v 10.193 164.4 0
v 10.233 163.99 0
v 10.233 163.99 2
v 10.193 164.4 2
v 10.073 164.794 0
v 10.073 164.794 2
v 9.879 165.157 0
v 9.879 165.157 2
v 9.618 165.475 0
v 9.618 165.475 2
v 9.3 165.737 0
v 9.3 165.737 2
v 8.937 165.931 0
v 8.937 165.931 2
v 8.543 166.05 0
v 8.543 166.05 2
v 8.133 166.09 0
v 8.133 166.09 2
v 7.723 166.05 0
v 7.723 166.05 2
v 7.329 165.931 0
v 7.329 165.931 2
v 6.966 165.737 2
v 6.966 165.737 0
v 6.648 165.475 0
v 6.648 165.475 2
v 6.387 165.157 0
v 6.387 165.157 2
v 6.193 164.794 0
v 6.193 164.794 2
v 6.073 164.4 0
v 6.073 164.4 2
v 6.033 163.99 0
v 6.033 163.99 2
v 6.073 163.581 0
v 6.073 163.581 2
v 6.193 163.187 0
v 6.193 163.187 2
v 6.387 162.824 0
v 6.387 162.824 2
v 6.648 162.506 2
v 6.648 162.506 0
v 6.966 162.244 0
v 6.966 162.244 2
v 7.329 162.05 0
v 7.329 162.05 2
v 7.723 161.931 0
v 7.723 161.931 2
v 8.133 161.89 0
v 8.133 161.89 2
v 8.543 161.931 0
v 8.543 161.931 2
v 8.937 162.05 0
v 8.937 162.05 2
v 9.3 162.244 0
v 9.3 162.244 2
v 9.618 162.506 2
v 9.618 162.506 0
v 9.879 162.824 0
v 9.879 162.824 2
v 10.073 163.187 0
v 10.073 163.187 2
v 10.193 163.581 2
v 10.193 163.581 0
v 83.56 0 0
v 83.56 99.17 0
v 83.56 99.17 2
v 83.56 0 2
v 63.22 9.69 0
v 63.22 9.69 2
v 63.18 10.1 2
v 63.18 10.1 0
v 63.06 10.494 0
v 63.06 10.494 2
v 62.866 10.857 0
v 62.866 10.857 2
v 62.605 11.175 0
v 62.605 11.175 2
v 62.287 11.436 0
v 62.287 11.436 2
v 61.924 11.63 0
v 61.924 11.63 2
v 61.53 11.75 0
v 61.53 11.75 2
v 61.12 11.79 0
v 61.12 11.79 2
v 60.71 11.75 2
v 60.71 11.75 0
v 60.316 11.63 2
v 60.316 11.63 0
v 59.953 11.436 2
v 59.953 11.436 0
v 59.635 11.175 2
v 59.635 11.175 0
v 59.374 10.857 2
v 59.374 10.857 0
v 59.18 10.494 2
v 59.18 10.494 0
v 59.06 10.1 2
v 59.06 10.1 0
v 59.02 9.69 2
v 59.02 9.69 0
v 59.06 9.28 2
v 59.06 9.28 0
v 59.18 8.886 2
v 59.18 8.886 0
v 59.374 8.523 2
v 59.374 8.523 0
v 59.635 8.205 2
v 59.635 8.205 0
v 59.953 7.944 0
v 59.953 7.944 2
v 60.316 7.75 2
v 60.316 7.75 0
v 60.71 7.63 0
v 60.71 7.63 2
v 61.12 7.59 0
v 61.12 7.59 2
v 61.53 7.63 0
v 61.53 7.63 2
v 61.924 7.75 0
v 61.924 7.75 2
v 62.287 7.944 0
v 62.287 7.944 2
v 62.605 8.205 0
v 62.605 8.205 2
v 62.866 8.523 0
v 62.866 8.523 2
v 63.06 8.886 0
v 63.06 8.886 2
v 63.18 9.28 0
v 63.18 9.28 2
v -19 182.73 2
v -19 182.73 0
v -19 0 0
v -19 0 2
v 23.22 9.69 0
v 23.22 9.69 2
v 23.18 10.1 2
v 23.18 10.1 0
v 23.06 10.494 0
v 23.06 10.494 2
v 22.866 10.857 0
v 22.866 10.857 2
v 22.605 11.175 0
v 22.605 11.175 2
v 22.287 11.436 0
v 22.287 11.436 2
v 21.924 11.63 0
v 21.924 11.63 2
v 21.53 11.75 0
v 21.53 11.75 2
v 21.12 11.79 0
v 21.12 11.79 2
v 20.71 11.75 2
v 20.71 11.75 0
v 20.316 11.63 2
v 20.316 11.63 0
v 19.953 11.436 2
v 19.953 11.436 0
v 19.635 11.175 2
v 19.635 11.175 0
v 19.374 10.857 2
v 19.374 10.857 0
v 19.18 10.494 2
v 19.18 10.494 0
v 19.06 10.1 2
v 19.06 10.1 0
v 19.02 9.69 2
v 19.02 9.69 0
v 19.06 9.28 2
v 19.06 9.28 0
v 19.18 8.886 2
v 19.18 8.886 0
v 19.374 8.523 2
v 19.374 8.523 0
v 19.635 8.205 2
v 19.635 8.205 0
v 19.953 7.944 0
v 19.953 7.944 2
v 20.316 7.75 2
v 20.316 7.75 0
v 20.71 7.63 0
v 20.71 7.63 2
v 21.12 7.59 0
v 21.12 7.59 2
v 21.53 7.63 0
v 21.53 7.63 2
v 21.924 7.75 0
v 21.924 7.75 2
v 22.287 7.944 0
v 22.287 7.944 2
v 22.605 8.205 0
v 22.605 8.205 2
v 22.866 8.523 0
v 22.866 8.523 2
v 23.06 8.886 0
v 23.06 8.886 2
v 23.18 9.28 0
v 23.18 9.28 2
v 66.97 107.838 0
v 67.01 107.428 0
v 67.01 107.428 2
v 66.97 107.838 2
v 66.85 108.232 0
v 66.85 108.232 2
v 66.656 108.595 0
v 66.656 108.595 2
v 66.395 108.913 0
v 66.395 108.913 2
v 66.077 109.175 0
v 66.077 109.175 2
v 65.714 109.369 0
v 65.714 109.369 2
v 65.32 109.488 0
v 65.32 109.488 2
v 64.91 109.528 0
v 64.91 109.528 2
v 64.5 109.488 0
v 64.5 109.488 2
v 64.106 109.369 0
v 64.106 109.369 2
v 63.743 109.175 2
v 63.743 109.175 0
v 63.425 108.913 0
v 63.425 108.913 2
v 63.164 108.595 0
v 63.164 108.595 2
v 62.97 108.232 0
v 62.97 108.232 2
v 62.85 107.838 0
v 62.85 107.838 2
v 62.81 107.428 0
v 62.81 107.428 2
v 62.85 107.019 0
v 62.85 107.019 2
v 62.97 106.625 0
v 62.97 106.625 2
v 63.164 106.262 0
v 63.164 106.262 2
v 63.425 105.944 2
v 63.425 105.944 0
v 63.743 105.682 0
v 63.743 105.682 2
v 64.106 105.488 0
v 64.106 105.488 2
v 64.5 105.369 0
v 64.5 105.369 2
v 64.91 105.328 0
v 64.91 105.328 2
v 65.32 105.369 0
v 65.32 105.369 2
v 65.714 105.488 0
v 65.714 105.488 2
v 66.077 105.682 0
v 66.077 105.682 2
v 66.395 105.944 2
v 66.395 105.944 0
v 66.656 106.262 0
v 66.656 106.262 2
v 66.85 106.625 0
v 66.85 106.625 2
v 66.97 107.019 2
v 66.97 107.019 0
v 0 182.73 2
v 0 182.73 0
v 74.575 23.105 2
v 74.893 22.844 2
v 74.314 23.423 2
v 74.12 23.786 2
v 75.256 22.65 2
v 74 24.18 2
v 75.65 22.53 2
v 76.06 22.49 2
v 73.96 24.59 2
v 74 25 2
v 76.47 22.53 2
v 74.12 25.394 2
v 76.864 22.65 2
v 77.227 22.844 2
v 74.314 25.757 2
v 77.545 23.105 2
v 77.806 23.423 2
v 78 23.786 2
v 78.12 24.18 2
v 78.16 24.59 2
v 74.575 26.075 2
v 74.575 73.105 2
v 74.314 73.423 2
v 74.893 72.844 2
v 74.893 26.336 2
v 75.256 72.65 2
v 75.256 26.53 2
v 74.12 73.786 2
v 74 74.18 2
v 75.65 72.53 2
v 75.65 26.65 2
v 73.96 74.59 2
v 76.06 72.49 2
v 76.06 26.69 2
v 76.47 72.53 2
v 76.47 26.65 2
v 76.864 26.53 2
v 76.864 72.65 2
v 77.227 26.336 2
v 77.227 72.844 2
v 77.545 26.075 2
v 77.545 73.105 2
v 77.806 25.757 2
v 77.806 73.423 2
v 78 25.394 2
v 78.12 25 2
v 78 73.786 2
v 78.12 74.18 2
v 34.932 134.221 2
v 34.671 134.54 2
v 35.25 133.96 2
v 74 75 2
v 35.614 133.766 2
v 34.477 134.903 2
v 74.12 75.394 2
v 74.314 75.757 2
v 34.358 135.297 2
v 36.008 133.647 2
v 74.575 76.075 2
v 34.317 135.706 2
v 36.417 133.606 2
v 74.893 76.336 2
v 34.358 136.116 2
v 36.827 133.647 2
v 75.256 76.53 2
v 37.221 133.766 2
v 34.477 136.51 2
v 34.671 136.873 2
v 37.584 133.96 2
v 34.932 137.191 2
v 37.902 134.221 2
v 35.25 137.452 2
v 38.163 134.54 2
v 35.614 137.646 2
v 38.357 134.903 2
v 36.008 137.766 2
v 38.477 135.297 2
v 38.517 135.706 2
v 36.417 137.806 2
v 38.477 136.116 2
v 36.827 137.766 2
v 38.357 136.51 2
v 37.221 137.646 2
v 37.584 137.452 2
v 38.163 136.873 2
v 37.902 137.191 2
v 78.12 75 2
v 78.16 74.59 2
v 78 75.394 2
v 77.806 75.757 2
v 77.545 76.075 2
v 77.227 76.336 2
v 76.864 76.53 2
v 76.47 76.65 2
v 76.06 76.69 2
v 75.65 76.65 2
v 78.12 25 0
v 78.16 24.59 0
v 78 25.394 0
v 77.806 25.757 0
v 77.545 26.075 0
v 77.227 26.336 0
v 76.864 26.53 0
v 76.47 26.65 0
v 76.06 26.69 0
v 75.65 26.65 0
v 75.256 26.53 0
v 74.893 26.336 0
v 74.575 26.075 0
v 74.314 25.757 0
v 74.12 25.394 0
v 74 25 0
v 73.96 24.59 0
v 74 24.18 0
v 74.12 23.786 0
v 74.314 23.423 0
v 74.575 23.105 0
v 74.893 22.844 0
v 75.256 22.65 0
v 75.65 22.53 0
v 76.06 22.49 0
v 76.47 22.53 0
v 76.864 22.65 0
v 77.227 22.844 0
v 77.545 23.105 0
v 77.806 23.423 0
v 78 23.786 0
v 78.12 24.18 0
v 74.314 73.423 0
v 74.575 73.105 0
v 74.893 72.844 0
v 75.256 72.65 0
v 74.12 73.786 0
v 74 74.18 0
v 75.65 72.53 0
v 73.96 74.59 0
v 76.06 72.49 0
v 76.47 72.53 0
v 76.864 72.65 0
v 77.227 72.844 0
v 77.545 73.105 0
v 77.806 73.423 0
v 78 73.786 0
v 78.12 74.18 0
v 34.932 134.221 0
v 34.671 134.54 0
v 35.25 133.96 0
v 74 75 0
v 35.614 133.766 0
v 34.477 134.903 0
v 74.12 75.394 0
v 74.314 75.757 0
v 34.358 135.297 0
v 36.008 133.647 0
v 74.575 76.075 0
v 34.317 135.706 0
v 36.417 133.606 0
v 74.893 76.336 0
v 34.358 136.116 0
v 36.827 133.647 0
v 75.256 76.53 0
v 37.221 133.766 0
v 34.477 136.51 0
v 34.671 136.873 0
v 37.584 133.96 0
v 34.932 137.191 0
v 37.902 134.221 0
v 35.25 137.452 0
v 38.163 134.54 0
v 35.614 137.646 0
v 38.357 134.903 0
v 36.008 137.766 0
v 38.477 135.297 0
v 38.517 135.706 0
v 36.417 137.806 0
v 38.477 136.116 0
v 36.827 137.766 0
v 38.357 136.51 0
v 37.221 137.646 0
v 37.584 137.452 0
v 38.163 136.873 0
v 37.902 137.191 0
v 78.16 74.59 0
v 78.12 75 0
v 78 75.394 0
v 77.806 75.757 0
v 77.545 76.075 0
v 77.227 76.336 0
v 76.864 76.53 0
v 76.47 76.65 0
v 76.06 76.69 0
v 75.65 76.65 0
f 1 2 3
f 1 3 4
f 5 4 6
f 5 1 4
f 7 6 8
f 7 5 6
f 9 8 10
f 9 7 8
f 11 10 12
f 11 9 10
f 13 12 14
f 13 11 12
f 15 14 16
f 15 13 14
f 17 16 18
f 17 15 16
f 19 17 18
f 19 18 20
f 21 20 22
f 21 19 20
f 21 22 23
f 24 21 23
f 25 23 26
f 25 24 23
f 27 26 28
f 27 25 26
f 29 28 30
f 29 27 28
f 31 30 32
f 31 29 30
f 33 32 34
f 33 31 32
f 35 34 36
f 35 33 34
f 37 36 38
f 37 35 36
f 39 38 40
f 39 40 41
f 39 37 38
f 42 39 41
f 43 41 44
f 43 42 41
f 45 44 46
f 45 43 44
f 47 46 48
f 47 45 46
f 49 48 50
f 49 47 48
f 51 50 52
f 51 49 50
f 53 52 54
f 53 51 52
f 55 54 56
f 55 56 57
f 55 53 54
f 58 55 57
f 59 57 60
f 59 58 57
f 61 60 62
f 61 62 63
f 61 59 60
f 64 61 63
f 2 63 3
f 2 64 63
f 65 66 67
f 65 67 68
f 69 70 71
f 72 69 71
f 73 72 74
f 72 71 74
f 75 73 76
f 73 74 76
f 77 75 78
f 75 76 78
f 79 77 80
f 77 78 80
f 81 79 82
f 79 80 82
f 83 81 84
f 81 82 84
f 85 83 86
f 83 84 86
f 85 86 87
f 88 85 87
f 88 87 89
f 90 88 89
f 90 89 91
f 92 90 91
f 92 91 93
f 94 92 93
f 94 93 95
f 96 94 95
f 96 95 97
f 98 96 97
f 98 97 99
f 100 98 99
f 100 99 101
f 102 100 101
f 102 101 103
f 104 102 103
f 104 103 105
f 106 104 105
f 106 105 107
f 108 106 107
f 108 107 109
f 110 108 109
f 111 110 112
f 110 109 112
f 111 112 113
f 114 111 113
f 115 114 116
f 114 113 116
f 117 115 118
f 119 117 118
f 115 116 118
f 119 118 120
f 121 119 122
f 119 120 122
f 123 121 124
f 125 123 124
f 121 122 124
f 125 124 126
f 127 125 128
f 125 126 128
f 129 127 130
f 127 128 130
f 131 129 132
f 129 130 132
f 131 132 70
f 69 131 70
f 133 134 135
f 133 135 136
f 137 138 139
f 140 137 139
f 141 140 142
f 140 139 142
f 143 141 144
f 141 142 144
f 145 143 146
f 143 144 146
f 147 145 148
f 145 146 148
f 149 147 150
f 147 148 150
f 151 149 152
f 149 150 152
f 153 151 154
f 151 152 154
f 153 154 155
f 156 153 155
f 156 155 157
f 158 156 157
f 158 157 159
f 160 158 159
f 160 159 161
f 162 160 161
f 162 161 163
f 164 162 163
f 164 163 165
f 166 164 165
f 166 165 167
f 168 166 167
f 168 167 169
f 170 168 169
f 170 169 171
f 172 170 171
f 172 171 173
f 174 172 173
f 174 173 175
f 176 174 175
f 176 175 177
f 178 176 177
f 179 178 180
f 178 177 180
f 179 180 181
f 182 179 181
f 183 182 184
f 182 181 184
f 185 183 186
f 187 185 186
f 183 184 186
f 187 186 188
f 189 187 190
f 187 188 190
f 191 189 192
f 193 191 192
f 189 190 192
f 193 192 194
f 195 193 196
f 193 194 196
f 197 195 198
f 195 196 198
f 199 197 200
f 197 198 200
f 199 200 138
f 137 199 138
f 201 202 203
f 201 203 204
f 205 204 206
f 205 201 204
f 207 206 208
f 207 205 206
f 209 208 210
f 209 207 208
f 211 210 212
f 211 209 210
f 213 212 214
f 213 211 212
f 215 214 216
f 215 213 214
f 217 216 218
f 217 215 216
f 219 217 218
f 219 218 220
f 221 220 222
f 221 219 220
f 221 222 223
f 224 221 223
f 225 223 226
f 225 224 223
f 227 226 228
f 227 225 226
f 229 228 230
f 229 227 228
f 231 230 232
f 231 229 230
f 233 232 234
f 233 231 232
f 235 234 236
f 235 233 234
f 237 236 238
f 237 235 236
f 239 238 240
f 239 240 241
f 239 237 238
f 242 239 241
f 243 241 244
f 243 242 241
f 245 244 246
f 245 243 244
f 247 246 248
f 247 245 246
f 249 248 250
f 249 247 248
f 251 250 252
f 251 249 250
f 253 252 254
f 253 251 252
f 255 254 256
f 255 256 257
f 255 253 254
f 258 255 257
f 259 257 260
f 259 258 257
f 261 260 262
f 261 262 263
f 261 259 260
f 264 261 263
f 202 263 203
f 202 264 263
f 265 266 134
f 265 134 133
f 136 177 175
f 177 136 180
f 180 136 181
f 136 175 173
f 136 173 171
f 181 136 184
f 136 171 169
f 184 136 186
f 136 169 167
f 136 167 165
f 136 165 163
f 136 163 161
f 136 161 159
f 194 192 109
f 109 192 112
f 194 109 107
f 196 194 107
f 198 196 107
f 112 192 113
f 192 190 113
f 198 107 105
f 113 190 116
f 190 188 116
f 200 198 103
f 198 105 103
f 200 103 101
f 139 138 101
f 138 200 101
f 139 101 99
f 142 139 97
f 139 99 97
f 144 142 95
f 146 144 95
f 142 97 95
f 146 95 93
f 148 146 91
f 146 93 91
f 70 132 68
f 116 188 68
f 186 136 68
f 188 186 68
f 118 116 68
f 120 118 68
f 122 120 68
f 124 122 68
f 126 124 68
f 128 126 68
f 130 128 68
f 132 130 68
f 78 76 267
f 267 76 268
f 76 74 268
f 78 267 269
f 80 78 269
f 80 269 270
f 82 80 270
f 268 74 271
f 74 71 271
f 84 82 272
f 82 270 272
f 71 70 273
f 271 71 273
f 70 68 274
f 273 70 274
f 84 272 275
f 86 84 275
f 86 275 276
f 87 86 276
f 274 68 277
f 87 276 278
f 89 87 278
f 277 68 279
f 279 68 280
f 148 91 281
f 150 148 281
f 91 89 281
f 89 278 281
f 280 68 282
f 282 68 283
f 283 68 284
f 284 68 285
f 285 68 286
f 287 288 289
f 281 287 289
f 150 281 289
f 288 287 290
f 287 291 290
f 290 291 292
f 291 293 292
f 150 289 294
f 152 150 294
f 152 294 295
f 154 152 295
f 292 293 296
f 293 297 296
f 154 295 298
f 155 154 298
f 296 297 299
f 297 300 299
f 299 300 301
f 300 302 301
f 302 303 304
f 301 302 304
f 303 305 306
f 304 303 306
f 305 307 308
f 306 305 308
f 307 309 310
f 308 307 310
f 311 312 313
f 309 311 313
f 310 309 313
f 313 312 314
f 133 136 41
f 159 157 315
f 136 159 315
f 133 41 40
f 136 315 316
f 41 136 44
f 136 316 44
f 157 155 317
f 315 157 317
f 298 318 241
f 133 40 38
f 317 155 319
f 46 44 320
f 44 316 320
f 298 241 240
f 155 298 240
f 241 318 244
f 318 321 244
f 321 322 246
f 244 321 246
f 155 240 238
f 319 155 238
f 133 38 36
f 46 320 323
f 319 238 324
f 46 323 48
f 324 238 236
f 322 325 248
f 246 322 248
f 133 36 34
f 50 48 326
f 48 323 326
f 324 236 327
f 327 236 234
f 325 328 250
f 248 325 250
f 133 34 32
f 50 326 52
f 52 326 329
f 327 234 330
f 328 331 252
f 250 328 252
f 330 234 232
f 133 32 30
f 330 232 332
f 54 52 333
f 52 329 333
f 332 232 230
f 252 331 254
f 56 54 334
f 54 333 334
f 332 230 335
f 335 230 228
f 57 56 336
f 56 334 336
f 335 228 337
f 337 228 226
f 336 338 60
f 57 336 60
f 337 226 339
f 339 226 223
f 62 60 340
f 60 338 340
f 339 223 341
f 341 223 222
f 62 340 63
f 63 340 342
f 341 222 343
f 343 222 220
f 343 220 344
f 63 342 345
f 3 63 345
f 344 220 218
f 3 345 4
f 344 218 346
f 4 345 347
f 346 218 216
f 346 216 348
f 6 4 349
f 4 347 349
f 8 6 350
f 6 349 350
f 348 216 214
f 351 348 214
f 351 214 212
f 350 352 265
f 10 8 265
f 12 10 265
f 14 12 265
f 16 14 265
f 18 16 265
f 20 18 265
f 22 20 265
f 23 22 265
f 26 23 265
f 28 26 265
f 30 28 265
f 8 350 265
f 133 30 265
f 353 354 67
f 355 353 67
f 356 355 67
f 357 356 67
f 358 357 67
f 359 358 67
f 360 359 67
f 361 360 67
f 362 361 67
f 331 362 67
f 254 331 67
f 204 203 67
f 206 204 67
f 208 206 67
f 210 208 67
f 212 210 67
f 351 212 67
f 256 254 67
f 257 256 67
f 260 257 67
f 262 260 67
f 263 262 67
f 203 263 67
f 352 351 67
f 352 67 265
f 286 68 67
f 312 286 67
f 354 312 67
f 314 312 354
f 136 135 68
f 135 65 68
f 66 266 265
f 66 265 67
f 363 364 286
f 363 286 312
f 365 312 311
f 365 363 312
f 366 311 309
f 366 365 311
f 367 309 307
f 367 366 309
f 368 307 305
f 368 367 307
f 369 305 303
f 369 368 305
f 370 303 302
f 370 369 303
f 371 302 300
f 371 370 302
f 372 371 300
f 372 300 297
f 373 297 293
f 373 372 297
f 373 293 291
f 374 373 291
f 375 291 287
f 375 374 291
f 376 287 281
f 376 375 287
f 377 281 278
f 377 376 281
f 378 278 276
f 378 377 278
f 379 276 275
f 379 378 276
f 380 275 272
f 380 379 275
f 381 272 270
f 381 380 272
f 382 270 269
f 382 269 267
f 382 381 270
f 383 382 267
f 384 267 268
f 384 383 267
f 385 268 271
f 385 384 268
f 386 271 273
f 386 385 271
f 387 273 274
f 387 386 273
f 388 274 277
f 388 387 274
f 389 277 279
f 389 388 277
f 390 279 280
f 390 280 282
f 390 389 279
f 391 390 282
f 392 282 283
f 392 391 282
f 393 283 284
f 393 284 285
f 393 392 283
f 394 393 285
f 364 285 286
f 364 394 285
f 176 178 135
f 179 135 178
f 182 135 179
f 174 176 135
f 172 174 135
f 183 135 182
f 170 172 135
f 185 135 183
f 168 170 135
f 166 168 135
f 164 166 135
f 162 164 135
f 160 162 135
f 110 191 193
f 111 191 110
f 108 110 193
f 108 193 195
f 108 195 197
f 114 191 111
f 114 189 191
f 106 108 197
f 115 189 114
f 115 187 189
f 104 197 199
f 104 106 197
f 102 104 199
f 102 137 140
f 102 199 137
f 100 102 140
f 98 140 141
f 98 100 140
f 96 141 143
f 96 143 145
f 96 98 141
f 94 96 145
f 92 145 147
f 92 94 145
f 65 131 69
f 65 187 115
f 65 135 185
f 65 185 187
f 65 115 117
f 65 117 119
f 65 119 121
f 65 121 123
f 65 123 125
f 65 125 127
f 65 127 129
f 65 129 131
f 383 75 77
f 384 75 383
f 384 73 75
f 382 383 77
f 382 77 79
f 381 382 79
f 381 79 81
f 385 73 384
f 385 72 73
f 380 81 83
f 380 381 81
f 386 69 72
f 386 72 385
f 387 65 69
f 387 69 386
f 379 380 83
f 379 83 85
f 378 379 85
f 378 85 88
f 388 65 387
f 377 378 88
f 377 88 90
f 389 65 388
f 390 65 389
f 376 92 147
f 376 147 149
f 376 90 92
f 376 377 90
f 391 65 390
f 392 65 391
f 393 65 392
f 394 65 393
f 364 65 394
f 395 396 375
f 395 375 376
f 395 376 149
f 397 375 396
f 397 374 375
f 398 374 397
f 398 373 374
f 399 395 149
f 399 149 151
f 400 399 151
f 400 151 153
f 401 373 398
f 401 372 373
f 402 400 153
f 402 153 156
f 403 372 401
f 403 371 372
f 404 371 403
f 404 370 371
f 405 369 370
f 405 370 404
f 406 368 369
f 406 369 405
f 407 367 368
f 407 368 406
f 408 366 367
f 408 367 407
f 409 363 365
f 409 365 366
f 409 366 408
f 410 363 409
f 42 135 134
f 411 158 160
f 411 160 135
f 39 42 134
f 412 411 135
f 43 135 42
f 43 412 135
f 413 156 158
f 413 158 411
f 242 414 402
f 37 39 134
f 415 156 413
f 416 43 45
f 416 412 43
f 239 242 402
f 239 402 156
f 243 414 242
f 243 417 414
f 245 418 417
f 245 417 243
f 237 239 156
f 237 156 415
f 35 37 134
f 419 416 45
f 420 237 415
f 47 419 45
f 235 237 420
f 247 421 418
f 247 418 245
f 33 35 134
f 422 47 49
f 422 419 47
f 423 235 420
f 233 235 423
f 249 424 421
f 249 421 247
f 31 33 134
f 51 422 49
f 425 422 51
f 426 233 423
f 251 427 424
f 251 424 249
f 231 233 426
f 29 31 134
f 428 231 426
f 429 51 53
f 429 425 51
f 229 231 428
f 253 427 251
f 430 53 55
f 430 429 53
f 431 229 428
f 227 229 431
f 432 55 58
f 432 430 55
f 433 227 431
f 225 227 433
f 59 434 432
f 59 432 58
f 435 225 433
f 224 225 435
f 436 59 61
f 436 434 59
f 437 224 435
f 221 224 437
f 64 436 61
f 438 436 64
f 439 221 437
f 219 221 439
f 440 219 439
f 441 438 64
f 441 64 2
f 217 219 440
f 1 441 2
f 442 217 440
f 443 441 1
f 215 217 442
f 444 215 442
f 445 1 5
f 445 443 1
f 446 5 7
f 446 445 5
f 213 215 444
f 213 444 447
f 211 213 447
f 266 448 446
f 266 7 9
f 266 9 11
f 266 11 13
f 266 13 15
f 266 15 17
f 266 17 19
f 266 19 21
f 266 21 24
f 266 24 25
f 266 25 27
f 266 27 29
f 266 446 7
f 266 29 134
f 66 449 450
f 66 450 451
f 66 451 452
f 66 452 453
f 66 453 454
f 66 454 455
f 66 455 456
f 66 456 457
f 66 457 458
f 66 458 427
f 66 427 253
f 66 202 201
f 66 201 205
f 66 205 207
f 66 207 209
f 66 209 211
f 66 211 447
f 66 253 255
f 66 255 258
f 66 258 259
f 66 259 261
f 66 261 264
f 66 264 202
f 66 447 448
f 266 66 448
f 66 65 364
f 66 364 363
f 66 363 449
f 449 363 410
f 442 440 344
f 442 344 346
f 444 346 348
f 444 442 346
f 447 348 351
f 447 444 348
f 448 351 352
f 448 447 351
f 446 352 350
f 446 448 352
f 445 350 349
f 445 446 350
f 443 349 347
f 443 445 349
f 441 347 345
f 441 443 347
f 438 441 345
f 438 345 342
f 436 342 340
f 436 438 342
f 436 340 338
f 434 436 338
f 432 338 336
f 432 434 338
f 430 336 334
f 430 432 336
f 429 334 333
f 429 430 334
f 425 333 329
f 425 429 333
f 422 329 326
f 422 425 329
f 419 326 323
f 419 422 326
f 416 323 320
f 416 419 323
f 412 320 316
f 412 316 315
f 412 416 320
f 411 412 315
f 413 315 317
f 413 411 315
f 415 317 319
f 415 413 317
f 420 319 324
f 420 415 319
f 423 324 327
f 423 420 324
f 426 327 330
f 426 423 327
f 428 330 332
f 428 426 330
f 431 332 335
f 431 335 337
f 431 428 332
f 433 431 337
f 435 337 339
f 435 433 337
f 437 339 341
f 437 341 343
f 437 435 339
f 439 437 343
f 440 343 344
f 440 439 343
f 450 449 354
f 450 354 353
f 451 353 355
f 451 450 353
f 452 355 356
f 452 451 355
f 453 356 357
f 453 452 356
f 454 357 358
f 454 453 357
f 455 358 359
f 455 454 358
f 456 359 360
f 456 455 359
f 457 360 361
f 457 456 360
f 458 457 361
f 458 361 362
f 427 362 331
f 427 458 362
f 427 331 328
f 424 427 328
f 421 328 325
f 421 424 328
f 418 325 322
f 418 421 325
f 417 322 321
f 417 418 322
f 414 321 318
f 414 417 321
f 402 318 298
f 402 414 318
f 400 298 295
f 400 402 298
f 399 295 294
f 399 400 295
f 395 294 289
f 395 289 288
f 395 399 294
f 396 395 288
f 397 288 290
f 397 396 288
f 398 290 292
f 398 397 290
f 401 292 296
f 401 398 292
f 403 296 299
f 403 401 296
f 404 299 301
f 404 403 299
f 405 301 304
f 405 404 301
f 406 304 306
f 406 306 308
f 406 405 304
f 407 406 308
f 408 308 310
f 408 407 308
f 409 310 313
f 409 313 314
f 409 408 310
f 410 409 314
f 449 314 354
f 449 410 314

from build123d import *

# Parameters (mm, degrees)
SKETCH_1_R          = 2.1
EXTRUDE_1_DEPTH     = 2
SKETCH_2_R          = 2.1
CUT_EXTRUDE_1_DEPTH = 10
SKETCH_3_W          = 2
SKETCH_3_H          = 182.73
EXTRUDE_2_DEPTH     = 19


with BuildPart() as part:
    # ｽｹｯﾁ1 → ﾎﾞｽ - 押し出し1 (new body)
    with BuildSketch(Plane.XY):
        Polygon((0, 0), (0, 182.73), (83.56, 99.17), (83.56, 0), align=None)
        with Locations((8.132919651, 163.990478631)):
            Circle(SKETCH_1_R, mode=Mode.SUBTRACT)
        with Locations((36.417190898, 135.706207384)):
            Circle(SKETCH_1_R, mode=Mode.SUBTRACT)
        with Locations((64.91002614, 107.428490375)):
            Circle(SKETCH_1_R, mode=Mode.SUBTRACT)
        with Locations((76.06, 74.59)):
            Circle(SKETCH_1_R, mode=Mode.SUBTRACT)
        with Locations((76.06, 24.59)):
            Circle(SKETCH_1_R, mode=Mode.SUBTRACT)
    extrude(amount=EXTRUDE_1_DEPTH)

    # ｽｹｯﾁ2 → ｶｯﾄ - 押し出し1 (cut)
    with BuildSketch(Plane.XY.offset(2)):
        with Locations((21.12, 9.69)):
            Circle(SKETCH_2_R)
        with Locations((61.12, 9.69)):
            Circle(SKETCH_2_R)
    extrude(amount=-CUT_EXTRUDE_1_DEPTH, mode=Mode.SUBTRACT)

    # ｽｹｯﾁ3 → ﾎﾞｽ - 押し出し2 (add)
    with BuildSketch(Plane.ZY):
        with Locations((1, 91.365)):
            Rectangle(SKETCH_3_W, SKETCH_3_H)
    extrude(amount=EXTRUDE_2_DEPTH)


solid = part.part
